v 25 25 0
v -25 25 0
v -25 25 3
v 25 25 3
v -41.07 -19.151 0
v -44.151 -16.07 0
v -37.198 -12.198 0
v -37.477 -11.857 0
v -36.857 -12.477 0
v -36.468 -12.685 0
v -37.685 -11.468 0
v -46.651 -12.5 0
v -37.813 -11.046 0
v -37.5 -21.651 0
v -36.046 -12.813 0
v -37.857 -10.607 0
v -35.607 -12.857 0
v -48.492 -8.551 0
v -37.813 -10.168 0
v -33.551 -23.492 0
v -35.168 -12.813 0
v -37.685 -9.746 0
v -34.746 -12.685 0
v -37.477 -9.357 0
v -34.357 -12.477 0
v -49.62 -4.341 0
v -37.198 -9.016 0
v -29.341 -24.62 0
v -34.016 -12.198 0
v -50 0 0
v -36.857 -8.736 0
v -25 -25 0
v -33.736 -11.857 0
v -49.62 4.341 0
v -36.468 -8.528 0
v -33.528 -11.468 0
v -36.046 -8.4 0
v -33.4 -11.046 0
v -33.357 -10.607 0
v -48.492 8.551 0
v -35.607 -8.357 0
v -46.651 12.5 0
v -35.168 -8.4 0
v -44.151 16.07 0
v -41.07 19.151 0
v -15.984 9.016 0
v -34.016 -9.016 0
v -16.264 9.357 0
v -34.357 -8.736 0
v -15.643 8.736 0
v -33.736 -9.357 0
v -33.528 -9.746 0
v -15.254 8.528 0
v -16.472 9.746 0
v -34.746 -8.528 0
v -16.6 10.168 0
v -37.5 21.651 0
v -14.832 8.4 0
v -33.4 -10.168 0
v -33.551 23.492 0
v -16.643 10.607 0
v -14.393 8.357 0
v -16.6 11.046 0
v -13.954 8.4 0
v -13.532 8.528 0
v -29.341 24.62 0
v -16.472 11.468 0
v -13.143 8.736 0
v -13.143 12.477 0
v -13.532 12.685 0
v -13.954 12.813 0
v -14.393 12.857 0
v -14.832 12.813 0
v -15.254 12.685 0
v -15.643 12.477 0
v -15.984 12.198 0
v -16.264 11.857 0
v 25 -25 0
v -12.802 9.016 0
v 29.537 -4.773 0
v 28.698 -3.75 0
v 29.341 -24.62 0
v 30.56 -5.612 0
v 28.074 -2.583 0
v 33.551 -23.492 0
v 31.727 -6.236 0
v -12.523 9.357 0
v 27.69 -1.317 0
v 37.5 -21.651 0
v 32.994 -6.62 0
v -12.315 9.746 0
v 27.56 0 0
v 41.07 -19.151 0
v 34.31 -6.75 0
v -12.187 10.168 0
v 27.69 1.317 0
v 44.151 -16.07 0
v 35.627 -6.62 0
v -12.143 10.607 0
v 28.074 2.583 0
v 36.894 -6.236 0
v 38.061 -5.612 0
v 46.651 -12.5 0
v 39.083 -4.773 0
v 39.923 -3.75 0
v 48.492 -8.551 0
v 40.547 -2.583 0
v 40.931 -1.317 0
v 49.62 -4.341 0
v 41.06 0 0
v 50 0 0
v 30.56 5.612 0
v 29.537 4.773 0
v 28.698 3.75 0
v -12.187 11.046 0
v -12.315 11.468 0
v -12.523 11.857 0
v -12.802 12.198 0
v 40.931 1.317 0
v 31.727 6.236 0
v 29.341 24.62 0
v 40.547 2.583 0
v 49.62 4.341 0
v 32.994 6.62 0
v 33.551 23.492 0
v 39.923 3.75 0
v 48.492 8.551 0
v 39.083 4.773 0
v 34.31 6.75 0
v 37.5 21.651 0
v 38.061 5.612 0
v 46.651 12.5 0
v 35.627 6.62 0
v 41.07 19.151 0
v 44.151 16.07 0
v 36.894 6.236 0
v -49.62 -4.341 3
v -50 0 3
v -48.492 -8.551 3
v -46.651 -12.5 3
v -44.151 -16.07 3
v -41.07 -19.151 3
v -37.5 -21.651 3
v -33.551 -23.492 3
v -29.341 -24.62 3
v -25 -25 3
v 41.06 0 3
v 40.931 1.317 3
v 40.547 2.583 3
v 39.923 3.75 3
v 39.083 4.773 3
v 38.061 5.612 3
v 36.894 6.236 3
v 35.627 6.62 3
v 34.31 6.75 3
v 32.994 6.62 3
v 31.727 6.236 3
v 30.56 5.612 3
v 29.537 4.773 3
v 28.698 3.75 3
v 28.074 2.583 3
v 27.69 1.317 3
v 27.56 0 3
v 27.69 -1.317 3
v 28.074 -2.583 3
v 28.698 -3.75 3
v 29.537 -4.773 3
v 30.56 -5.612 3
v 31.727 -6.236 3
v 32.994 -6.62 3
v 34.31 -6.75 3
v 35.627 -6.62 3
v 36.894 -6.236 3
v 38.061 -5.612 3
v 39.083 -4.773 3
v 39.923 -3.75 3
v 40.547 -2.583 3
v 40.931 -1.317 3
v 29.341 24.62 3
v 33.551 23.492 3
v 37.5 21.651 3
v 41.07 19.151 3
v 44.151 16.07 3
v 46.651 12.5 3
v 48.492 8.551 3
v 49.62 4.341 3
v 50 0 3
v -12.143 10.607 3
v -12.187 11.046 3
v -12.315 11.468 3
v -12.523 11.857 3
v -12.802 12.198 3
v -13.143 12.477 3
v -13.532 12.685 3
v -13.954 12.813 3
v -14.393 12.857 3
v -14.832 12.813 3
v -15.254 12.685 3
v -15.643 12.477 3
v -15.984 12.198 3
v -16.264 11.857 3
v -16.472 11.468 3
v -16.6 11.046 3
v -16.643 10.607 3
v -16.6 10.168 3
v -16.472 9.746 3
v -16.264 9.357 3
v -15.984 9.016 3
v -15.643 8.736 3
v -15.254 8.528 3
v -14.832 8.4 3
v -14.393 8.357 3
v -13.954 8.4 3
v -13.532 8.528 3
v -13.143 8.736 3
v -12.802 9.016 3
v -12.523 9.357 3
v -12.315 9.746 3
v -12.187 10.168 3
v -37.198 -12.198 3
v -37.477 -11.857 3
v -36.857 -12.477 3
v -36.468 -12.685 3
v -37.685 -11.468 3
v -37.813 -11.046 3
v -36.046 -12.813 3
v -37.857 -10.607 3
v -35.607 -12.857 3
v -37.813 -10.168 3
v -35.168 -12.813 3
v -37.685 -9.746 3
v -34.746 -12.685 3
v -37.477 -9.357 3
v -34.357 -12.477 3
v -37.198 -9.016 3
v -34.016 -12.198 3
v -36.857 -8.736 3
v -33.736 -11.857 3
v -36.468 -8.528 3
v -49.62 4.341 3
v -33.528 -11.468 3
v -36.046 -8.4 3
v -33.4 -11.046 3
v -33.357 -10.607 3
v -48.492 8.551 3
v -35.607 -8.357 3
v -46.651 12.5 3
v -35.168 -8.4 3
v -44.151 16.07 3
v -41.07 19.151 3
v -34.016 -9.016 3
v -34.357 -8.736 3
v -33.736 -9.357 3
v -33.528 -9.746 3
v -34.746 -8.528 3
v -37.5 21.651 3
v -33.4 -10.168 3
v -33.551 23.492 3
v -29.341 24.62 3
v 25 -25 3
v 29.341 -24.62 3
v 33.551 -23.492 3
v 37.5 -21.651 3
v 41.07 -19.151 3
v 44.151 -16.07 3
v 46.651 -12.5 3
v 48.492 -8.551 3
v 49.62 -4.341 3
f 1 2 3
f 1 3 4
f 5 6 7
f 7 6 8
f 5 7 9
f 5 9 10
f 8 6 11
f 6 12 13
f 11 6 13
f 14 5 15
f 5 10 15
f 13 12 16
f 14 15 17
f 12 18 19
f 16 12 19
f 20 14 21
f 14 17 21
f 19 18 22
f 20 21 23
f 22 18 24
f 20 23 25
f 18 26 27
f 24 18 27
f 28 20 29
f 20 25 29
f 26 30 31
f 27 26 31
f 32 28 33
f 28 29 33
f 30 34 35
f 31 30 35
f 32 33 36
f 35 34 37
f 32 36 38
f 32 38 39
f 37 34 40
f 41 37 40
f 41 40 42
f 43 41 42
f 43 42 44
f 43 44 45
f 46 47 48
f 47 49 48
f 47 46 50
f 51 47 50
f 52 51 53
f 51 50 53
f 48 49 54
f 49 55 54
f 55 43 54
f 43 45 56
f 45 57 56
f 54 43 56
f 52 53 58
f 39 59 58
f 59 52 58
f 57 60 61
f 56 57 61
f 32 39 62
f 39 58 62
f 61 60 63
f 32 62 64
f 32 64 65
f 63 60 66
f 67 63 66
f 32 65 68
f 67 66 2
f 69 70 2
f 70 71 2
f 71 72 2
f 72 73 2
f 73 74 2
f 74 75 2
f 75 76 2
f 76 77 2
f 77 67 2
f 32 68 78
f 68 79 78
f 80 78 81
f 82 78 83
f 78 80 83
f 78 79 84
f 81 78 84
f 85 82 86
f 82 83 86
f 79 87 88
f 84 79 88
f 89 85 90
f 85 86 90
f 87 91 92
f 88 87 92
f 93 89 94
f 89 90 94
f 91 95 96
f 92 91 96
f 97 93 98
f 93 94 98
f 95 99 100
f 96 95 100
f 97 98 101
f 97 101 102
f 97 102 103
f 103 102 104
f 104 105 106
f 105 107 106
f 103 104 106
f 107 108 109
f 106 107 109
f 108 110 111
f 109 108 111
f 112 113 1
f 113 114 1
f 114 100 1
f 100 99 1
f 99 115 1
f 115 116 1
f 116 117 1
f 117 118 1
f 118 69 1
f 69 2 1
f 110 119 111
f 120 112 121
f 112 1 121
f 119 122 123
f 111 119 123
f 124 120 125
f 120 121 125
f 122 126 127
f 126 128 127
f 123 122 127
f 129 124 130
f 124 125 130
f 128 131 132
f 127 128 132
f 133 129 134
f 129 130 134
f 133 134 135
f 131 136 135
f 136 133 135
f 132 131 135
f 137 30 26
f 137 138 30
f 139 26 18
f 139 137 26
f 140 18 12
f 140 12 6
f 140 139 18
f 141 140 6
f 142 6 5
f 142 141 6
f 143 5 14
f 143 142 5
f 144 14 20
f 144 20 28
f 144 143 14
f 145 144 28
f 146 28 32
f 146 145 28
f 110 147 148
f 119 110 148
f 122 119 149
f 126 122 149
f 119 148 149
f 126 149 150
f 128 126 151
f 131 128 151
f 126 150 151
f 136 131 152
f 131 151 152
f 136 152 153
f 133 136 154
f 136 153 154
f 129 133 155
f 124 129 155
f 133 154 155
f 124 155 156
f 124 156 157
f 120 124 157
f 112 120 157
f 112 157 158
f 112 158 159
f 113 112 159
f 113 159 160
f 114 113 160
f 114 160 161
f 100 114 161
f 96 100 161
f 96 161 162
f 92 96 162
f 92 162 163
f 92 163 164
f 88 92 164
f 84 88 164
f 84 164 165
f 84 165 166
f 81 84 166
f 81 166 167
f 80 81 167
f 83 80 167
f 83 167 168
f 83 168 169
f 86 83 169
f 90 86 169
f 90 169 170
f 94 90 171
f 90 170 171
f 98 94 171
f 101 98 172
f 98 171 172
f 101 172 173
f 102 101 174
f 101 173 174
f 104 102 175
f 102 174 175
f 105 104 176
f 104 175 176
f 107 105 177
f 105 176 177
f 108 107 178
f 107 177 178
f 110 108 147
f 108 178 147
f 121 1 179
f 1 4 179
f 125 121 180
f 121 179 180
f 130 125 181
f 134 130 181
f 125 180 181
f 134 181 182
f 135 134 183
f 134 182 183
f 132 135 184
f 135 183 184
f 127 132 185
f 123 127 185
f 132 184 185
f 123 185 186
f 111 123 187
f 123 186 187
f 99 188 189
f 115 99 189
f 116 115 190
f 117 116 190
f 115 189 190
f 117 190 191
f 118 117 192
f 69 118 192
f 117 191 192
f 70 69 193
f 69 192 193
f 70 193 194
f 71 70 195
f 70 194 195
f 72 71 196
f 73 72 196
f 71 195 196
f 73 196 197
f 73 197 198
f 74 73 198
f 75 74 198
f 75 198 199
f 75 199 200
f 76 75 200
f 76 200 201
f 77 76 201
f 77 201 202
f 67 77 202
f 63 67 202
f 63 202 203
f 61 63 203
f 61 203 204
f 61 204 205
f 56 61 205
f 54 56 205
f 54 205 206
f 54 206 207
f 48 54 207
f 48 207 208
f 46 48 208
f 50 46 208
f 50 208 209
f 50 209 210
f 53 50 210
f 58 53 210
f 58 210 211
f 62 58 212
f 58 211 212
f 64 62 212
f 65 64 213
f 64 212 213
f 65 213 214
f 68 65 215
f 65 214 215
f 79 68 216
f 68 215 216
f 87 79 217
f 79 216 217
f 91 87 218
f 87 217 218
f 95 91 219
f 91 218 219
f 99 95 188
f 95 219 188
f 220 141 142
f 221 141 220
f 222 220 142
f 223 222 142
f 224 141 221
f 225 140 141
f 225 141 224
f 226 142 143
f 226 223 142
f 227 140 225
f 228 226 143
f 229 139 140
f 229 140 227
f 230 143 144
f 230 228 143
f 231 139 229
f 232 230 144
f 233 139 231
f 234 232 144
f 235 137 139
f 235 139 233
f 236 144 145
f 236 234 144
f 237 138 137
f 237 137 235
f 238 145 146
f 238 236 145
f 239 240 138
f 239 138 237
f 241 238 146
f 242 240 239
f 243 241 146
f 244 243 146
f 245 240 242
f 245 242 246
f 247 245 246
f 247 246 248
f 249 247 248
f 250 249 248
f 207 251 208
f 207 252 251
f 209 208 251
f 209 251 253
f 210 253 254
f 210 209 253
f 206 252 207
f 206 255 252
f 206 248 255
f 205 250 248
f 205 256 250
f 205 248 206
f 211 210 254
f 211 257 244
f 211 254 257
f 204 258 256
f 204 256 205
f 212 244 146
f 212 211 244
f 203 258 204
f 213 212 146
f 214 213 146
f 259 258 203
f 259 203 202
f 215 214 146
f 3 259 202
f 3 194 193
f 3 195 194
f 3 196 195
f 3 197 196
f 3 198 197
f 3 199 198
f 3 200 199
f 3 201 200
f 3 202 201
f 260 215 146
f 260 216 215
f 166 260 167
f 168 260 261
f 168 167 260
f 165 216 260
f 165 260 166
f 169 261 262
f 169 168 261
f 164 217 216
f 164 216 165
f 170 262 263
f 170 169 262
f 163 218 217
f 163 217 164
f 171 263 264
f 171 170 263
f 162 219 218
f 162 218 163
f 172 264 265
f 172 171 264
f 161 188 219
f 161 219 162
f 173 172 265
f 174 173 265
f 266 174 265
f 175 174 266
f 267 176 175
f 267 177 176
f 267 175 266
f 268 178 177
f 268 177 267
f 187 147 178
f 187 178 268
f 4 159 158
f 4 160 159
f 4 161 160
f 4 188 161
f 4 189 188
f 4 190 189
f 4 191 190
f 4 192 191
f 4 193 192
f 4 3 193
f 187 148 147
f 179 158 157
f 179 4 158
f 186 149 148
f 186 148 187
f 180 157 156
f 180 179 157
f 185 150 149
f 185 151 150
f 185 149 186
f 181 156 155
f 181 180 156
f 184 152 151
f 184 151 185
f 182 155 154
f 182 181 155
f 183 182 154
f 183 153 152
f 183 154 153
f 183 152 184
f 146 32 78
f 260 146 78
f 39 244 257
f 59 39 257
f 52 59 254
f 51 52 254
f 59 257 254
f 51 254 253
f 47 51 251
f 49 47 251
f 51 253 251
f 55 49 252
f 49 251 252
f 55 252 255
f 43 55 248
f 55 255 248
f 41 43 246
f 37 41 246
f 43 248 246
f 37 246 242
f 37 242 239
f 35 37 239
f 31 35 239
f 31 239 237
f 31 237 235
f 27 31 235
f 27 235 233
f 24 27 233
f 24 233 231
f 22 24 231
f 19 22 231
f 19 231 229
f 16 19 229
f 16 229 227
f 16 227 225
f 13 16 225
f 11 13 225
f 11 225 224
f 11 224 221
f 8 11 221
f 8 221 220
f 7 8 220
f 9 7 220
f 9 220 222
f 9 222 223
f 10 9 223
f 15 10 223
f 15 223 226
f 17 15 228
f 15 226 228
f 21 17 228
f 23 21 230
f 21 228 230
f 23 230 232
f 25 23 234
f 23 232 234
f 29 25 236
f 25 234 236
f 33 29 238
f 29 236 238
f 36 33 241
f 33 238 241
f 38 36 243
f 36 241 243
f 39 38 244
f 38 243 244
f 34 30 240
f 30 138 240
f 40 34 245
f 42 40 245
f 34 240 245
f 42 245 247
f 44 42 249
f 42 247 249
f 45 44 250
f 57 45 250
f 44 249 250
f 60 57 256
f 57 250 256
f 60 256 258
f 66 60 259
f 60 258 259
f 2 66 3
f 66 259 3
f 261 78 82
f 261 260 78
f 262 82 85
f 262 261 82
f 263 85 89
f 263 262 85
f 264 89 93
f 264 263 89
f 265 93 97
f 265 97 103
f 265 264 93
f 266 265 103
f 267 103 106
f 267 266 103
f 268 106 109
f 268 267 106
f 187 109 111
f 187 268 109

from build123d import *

# Parameters (mm, degrees)
SKETCH1_W           = 100
SKETCH1_H           = 50
BOSS_EXTRUDE1_DEPTH = 3
SKETCH2_R           = 6.75
SKETCH2_R_2         = 2.25
CUT_EXTRUDE1_DEPTH  = 56.982140009
FILLET1_R           = 25


with BuildPart() as part:
    # Sketch1 → Boss-Extrude1 (new body)
    with BuildSketch(Plane.XY):
        Rectangle(SKETCH1_W, SKETCH1_H)
    extrude(amount=BOSS_EXTRUDE1_DEPTH)

    # Sketch2 → Cut-Extrude1 (cut, through all)
    with BuildSketch(Plane.XY.offset(3)):
        with Locations((34.310453011, 0)):
            Circle(SKETCH2_R)
        with Locations((-14.393398282, 10.606601718)):
            Circle(SKETCH2_R_2)
        with Locations((-35.606601718, -10.606601718)):
            Circle(SKETCH2_R_2)
    extrude(amount=-CUT_EXTRUDE1_DEPTH, mode=Mode.SUBTRACT)

    # Fillet1
    fillet1_edges = [part.edges().sort_by_distance(p)[0] for p in [
        (-50, -25, 1.5),
        (-50, 25, 1.5),
        (50, 25, 1.5),
        (50, -25, 1.5),
    ]]
    fillet(fillet1_edges, radius=FILLET1_R - 0.0001)  # a hair under: the kernel refuses the full size


solid = part.part
